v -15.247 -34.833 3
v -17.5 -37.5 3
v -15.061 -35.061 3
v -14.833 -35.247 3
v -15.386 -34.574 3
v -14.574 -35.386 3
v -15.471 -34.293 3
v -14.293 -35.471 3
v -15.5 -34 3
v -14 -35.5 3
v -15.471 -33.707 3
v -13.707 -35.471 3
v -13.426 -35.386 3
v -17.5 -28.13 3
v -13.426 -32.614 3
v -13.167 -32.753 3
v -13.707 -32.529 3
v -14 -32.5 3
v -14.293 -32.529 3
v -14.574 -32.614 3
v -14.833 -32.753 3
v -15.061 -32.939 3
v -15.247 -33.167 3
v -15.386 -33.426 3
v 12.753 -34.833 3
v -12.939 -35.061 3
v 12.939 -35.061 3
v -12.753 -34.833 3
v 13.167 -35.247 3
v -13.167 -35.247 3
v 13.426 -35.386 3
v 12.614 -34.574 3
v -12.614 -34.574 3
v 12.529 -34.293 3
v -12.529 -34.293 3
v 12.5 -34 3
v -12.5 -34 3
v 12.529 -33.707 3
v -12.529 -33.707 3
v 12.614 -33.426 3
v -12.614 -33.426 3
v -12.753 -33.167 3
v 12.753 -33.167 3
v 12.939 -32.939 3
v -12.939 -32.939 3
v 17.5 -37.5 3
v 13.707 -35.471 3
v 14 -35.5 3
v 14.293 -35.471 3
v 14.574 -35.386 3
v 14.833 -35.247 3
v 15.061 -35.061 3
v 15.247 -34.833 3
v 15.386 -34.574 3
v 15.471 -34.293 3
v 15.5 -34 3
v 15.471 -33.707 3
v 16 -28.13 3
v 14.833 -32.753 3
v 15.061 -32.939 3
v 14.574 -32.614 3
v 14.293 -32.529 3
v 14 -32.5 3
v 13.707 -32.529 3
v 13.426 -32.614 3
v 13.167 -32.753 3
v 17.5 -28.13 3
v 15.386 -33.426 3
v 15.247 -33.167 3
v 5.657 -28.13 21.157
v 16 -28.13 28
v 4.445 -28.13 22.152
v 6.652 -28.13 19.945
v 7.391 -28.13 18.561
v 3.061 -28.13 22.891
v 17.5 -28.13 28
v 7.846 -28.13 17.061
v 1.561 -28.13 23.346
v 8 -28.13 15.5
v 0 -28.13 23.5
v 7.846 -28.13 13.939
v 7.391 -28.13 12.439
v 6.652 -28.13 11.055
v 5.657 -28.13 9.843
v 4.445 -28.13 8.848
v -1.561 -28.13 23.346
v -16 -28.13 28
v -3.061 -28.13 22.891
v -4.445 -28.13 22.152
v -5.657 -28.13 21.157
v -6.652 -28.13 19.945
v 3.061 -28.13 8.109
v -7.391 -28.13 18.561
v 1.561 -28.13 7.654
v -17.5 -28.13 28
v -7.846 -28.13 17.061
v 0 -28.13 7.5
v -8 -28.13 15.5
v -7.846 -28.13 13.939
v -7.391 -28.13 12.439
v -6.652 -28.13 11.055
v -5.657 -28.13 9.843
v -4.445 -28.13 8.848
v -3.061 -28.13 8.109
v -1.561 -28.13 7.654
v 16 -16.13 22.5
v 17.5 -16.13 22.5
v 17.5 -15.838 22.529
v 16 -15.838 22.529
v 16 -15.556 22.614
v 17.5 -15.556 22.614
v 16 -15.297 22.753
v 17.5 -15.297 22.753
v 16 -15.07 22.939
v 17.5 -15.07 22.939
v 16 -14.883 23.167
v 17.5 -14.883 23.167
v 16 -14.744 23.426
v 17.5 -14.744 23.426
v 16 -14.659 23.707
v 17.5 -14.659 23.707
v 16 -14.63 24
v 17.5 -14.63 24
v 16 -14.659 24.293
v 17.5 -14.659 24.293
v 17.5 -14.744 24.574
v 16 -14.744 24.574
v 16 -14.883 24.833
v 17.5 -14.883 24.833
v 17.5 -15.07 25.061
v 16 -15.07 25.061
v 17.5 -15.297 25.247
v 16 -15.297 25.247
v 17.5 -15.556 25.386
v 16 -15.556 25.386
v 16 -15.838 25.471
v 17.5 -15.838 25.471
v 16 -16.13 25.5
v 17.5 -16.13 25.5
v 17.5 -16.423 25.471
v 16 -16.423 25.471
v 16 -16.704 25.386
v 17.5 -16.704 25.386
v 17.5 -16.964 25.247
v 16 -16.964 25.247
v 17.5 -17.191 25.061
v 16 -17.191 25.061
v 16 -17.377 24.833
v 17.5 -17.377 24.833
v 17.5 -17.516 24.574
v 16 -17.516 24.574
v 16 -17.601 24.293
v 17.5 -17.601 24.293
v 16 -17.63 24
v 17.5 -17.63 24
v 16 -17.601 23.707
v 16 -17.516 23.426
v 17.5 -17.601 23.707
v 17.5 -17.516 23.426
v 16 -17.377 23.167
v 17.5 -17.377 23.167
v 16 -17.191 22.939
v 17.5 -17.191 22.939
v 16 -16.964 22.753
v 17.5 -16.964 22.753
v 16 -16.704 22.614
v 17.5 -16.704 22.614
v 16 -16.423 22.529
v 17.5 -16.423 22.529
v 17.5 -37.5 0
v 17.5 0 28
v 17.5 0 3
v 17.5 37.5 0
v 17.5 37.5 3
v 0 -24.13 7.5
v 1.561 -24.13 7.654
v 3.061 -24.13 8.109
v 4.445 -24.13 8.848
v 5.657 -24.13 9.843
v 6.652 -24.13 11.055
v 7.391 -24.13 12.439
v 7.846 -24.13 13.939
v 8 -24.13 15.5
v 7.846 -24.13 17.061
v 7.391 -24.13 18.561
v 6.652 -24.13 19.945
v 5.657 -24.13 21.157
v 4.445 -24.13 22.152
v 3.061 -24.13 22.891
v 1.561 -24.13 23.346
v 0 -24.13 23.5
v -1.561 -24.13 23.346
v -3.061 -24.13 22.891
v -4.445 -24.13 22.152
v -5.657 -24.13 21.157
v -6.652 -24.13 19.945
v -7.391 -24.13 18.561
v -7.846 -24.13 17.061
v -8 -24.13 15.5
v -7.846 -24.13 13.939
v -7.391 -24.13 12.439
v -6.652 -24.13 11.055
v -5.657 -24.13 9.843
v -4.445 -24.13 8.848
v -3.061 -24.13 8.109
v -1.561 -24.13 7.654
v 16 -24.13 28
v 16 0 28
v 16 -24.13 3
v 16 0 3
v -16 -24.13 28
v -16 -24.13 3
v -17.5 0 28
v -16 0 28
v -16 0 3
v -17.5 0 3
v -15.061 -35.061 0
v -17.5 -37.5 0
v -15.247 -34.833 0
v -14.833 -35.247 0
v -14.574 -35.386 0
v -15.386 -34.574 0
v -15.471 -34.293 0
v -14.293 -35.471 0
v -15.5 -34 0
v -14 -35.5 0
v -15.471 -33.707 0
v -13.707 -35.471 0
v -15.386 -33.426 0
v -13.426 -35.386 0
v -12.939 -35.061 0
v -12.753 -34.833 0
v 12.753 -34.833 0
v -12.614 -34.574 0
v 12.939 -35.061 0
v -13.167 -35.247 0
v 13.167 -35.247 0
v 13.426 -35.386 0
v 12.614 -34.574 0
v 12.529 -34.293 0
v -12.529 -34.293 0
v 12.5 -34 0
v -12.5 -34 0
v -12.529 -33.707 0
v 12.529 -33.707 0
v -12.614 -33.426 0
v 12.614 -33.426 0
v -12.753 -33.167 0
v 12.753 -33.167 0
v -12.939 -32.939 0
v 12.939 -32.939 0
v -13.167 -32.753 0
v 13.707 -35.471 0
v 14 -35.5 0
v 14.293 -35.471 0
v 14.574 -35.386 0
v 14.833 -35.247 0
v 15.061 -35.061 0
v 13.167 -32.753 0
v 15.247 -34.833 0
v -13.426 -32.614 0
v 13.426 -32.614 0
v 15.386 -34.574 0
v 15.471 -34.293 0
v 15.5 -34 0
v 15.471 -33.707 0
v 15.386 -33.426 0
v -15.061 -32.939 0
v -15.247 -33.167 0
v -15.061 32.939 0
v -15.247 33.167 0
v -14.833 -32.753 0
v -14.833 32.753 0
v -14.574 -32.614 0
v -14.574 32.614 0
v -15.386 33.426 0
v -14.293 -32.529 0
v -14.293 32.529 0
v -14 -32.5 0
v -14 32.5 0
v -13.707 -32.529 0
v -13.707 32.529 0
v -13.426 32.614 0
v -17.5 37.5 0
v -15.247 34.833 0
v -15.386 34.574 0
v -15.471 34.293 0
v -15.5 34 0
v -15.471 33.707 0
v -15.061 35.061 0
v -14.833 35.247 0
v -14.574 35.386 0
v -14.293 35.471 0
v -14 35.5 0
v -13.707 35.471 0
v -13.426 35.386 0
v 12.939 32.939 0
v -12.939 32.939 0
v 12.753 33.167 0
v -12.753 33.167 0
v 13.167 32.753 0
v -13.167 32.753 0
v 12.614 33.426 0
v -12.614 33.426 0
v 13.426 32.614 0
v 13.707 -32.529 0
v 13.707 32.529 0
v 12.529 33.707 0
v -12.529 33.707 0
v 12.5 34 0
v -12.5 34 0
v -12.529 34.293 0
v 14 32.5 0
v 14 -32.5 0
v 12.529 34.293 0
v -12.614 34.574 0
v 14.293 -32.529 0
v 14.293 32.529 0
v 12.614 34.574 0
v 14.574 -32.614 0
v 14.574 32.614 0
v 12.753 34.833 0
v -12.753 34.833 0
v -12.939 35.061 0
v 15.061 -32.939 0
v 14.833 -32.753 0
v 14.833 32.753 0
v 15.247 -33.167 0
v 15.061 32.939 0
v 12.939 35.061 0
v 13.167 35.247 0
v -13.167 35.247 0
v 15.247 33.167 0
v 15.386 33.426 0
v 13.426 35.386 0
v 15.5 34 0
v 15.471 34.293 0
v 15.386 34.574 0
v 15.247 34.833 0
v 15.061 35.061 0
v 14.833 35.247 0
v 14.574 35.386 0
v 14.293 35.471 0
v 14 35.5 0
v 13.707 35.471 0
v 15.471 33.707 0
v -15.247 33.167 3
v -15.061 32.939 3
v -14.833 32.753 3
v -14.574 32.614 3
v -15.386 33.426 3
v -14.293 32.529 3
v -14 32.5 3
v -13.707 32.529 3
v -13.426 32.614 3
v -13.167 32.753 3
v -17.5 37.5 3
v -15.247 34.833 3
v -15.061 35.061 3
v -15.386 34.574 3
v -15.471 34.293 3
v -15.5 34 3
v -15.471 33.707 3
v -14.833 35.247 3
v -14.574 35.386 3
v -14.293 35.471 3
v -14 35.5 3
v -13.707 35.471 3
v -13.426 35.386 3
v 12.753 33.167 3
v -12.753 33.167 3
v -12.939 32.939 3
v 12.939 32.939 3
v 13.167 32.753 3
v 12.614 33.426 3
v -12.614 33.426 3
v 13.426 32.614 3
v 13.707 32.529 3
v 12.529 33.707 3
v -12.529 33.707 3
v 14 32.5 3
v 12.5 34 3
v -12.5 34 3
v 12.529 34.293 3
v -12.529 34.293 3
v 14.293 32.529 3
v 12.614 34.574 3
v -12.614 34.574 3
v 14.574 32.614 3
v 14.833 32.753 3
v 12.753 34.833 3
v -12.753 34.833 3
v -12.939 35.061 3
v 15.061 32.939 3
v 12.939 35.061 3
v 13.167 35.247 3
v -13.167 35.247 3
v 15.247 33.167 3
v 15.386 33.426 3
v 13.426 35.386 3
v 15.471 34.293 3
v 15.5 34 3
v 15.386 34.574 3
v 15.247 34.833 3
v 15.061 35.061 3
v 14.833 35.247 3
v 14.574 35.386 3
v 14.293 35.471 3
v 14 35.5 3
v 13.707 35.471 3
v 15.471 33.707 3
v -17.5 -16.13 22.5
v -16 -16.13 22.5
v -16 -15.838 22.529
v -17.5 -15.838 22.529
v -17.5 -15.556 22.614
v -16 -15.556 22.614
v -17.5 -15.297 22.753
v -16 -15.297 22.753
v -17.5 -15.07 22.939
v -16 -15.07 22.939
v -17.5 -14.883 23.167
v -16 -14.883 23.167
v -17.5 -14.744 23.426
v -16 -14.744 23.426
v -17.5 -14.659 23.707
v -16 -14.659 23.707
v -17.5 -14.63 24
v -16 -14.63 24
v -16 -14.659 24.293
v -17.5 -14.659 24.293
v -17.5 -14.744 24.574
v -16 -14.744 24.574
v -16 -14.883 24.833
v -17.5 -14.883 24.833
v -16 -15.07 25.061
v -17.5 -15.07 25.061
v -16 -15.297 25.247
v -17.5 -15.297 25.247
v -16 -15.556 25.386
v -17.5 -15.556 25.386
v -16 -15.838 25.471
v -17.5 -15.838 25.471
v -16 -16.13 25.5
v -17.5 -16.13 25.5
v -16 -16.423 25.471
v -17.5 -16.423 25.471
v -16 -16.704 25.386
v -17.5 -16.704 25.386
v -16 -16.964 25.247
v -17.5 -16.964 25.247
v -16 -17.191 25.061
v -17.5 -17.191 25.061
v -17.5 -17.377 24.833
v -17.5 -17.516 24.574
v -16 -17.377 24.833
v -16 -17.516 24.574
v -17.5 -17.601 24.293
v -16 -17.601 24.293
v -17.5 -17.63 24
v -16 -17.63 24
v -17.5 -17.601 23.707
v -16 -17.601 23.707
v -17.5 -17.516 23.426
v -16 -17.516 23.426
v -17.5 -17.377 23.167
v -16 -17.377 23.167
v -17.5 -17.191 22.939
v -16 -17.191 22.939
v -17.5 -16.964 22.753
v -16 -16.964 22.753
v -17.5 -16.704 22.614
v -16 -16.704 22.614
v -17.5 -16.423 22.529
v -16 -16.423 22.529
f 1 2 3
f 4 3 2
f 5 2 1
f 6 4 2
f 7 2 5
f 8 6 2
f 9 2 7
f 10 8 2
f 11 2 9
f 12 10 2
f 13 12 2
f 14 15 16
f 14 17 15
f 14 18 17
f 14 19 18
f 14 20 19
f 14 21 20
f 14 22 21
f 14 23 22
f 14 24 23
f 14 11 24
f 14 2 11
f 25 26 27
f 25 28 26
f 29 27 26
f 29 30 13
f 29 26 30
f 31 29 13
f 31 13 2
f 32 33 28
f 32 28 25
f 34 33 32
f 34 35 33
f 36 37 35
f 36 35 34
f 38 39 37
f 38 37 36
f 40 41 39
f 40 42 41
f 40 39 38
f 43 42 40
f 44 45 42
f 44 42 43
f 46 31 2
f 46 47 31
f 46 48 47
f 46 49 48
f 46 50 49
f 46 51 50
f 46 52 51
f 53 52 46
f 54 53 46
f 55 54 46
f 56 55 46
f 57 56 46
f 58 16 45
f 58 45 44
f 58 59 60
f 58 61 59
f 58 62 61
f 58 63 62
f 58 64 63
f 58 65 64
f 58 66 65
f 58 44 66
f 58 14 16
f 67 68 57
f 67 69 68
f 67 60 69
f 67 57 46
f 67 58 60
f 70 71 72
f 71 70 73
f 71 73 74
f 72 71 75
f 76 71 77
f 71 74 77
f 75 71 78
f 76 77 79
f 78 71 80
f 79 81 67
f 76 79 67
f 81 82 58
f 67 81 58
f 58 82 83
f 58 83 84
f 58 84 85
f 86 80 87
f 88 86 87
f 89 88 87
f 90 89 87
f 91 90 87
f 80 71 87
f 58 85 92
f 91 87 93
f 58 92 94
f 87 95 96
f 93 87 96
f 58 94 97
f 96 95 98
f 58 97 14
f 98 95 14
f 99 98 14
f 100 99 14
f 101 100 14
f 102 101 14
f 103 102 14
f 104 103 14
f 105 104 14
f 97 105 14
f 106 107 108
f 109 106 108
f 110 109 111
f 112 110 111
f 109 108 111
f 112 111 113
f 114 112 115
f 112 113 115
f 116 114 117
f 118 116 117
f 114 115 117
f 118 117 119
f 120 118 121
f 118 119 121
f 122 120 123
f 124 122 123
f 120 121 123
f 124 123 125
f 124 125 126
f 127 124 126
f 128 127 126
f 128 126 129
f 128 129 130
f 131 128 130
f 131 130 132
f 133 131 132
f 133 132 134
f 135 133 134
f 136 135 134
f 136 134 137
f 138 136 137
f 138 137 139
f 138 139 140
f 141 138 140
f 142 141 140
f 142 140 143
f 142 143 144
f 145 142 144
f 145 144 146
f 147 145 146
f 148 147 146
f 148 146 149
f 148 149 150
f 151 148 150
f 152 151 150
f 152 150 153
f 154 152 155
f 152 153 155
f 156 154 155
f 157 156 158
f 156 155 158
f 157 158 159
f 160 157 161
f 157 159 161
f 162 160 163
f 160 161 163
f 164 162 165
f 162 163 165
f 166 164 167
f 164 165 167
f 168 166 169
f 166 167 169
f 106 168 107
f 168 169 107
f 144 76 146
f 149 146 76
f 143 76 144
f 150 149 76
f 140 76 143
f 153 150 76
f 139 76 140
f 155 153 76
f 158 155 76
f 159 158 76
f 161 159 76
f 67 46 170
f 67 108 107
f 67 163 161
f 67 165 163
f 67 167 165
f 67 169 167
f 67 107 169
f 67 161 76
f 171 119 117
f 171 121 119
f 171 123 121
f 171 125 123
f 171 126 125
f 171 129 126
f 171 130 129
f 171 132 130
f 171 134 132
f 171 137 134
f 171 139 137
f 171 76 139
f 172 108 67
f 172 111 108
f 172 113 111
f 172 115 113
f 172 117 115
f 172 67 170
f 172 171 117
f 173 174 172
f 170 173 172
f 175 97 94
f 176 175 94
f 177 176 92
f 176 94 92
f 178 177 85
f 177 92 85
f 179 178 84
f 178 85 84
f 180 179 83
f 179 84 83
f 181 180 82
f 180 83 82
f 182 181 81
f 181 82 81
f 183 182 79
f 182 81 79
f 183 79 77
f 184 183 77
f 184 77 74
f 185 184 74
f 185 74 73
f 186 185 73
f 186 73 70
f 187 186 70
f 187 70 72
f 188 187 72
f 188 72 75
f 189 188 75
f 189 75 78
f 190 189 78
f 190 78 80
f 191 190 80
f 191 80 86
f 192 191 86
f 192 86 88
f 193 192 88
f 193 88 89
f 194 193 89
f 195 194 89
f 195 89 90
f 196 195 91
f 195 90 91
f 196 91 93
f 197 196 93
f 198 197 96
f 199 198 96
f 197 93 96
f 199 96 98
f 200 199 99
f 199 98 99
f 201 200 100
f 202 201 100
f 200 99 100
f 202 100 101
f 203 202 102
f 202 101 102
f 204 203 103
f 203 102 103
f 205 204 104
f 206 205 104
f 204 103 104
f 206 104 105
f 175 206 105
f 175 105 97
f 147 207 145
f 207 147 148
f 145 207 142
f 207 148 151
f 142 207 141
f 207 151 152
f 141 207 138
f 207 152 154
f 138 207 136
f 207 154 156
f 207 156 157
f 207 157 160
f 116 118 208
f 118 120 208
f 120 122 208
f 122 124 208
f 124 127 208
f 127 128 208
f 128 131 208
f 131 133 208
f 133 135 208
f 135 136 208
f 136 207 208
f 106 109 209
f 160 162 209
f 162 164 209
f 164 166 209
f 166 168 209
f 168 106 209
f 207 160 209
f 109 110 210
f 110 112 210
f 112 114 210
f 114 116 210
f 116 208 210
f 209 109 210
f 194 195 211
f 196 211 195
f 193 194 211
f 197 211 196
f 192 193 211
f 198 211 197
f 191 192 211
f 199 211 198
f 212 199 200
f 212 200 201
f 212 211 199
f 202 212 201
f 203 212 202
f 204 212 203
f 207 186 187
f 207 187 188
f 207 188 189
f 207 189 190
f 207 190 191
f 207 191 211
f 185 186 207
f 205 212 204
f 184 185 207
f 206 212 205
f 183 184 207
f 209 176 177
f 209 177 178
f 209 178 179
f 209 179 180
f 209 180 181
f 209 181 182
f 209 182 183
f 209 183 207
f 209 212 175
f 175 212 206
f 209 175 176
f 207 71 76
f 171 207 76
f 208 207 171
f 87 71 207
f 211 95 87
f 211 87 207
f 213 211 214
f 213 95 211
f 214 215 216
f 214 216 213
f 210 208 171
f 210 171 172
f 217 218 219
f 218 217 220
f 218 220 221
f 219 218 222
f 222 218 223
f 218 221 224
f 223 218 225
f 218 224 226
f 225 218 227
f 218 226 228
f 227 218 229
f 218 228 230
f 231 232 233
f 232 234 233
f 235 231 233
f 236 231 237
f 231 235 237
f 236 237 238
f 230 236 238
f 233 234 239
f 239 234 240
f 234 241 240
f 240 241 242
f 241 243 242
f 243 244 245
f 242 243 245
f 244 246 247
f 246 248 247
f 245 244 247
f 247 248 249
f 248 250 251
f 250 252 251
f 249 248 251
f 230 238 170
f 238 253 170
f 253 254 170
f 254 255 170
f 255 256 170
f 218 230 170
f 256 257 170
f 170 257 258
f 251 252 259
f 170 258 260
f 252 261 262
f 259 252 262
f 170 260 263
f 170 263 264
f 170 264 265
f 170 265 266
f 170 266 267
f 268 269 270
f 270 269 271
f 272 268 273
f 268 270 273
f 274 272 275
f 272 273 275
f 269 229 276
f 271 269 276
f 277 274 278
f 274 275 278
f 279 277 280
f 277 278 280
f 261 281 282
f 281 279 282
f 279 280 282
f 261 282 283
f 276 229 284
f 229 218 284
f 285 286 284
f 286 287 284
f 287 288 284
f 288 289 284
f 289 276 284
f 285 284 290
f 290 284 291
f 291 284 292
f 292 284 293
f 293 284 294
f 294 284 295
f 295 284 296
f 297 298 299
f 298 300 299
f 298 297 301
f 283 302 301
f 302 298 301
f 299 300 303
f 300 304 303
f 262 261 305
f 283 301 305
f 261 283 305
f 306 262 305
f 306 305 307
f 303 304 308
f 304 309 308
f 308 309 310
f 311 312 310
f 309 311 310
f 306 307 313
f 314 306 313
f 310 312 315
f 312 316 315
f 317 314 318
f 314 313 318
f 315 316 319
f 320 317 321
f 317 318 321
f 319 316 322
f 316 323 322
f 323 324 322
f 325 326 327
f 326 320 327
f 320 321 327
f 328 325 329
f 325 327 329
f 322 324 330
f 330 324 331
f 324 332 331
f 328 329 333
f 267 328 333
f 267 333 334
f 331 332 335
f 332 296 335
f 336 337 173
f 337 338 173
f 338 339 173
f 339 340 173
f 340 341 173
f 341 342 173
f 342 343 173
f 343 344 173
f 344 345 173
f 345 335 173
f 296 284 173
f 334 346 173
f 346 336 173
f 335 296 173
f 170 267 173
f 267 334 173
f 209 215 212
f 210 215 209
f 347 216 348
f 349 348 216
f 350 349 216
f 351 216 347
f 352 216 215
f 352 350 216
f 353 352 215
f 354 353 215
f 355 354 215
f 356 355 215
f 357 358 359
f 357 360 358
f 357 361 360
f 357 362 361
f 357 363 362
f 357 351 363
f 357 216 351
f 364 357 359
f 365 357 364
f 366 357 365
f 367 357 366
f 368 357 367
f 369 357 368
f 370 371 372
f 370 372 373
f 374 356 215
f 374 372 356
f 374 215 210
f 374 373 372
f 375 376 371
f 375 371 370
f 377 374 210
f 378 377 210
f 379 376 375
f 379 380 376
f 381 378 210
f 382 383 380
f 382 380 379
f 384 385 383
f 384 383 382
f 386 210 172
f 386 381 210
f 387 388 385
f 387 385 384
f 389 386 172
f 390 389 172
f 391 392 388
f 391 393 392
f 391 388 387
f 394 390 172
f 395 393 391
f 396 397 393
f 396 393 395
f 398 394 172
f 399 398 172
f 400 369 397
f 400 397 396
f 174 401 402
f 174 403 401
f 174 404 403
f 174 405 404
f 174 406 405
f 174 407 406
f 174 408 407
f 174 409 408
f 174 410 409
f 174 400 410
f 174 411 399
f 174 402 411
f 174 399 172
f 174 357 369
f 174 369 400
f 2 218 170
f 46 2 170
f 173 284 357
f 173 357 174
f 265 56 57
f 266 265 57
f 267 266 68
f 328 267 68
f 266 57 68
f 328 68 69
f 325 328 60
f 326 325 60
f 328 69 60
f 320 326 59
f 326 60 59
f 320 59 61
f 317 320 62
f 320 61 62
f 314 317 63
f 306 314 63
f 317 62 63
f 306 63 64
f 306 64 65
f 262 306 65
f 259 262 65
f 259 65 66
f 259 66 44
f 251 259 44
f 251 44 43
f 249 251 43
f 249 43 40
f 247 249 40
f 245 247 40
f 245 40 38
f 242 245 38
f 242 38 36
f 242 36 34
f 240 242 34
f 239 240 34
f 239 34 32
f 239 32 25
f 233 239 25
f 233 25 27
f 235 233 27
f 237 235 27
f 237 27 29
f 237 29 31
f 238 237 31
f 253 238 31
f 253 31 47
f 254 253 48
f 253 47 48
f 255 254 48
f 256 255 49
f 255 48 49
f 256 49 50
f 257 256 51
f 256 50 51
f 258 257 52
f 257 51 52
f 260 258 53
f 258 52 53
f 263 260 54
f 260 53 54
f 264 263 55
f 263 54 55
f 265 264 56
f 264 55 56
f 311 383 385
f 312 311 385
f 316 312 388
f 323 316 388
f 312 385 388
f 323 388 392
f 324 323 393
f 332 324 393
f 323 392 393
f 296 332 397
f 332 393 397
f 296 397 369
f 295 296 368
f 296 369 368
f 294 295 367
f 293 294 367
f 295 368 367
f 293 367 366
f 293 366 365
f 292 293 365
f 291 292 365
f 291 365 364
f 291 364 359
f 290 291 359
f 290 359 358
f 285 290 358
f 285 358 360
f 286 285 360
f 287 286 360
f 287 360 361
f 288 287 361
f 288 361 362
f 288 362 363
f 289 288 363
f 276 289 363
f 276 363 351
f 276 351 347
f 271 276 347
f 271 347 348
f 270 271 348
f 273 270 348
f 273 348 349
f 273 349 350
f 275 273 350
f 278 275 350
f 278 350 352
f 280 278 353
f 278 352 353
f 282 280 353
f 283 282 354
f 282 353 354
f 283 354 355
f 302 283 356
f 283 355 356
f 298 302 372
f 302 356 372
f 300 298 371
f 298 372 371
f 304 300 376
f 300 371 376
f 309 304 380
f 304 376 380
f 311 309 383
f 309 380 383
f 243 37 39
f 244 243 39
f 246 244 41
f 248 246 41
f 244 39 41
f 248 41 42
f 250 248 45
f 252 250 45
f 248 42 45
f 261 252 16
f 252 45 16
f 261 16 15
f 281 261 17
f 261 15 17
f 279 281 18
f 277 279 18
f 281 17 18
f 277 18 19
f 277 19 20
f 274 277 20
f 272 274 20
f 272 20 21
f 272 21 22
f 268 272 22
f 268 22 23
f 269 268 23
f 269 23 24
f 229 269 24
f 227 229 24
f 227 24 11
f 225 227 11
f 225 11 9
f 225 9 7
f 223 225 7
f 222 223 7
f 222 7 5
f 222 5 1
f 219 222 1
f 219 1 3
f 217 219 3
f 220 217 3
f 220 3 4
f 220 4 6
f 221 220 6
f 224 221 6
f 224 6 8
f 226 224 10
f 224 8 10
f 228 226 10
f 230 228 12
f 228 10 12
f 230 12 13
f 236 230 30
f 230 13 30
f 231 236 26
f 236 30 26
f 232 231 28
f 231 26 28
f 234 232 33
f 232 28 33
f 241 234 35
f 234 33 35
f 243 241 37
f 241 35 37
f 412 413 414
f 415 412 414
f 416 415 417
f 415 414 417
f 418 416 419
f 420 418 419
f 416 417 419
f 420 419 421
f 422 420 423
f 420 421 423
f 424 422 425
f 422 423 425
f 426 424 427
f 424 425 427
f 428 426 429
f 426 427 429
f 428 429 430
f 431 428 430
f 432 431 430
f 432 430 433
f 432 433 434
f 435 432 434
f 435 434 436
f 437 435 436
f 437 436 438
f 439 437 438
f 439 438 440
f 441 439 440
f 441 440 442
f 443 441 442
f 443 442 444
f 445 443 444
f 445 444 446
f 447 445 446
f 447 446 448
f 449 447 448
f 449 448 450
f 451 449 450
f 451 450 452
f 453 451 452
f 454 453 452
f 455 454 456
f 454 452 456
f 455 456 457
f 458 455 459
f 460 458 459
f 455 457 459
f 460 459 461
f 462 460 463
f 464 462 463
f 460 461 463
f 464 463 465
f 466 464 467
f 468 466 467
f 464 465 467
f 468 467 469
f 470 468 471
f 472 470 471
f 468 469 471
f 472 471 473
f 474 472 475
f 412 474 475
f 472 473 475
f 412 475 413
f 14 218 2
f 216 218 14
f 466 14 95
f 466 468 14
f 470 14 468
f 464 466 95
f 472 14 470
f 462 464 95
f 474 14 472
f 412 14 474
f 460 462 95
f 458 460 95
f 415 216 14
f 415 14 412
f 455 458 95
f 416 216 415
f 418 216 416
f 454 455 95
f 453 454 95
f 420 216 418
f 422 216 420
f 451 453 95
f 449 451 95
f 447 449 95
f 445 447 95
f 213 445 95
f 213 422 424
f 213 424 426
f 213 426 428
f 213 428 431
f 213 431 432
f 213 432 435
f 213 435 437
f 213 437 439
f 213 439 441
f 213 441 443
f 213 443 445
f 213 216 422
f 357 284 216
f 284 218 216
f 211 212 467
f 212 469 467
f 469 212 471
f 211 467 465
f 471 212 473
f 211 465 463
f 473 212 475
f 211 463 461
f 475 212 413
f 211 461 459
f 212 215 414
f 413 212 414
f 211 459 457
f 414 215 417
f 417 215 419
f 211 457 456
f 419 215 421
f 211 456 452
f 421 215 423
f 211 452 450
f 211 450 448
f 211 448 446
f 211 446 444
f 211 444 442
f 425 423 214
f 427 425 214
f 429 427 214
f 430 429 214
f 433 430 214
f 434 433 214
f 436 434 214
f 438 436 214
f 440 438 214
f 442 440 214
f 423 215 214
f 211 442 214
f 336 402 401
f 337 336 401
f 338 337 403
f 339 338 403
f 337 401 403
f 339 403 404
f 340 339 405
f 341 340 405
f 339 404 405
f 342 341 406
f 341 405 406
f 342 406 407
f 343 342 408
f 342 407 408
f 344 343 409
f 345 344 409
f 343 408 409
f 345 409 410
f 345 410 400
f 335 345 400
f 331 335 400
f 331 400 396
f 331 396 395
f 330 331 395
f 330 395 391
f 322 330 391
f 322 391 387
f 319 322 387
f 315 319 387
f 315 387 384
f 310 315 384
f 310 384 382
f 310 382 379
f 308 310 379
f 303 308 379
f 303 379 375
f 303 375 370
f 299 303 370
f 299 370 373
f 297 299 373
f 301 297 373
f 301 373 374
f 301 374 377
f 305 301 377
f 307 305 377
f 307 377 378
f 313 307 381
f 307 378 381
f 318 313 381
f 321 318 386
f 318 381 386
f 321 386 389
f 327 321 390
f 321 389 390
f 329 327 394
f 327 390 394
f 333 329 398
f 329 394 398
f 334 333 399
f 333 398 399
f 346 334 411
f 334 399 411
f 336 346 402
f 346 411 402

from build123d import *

# Parameters (mm, degrees)
SKETCH1_W           = 35
SKETCH1_H           = 75
BOSS_EXTRUDE1_DEPTH = 3
SKETCH2_R           = 1.5
SIDE_HOLES_DEPTH    = 13
SKETCH3_W           = 32
SKETCH3_H           = 4
BOSS_EXTRUDE2_DEPTH = 25
SKETCH4_R           = 8
CUT_EXTRUDE2_DEPTH  = 5
SKETCH5_W           = 25
SKETCH5_H           = 28.130280997
BOSS_EXTRUDE3_DEPTH = 1.5
SKETCH6_W           = 25
SKETCH6_H           = 28.130280997
BOSS_EXTRUDE4_DEPTH = 1.5
SKETCH7_R           = 1.5
CUT_EXTRUDE3_DEPTH  = 59.440140315


with BuildPart() as part:
    # Sketch1 → Boss-Extrude1 (new body)
    with BuildSketch(Plane.XY):
        Rectangle(SKETCH1_W, SKETCH1_H)
    extrude(amount=BOSS_EXTRUDE1_DEPTH)

    # Sketch2 → side holes (cut)
    with BuildSketch(Plane.XY.offset(3)):
        with Locations((14, 34)):
            Circle(SKETCH2_R)
        with Locations((-14, 34)):
            Circle(SKETCH2_R)
        with Locations((14, -34)):
            Circle(SKETCH2_R)
        with Locations((-14, -34)):
            Circle(SKETCH2_R)
    extrude(amount=-SIDE_HOLES_DEPTH, mode=Mode.SUBTRACT)

    # Sketch3 → Boss-Extrude2 (add)
    with BuildSketch(Plane.XY.offset(3)):
        with Locations((0, -26.130280997)):
            Rectangle(SKETCH3_W, SKETCH3_H)
    extrude(amount=BOSS_EXTRUDE2_DEPTH)

    # Sketch4 → Cut-Extrude2 (cut)
    with BuildSketch(Plane.XZ.offset(28.130280997)):
        with Locations(Location((0, 15.5, 0), (0, 0, 270))):
            Circle(SKETCH4_R)
    extrude(amount=-CUT_EXTRUDE2_DEPTH, mode=Mode.SUBTRACT)

    # Sketch5 → Boss-Extrude3 (add)
    with BuildSketch(Plane.ZY.offset(16)):
        with Locations((15.5, -14.065140499)):
            Rectangle(SKETCH5_W, SKETCH5_H)
    extrude(amount=BOSS_EXTRUDE3_DEPTH)

    # Sketch6 → Boss-Extrude4 (add)
    with BuildSketch(Plane(origin=(16, 0, 0), x_dir=(0, 0, -1), z_dir=(1, 0, 0))):
        with Locations((-15.5, -14.065140499)):
            Rectangle(SKETCH6_W, SKETCH6_H)
    extrude(amount=BOSS_EXTRUDE4_DEPTH)

    # Sketch7 → Cut-Extrude3 (cut, through all)
    with BuildSketch(Plane(origin=(17.5, 0, 0), x_dir=(0, 0, -1), z_dir=(1, 0, 0))):
        with Locations((-24, -16.130280997)):
            Circle(SKETCH7_R)
    extrude(amount=-CUT_EXTRUDE3_DEPTH, mode=Mode.SUBTRACT)


solid = part.part
